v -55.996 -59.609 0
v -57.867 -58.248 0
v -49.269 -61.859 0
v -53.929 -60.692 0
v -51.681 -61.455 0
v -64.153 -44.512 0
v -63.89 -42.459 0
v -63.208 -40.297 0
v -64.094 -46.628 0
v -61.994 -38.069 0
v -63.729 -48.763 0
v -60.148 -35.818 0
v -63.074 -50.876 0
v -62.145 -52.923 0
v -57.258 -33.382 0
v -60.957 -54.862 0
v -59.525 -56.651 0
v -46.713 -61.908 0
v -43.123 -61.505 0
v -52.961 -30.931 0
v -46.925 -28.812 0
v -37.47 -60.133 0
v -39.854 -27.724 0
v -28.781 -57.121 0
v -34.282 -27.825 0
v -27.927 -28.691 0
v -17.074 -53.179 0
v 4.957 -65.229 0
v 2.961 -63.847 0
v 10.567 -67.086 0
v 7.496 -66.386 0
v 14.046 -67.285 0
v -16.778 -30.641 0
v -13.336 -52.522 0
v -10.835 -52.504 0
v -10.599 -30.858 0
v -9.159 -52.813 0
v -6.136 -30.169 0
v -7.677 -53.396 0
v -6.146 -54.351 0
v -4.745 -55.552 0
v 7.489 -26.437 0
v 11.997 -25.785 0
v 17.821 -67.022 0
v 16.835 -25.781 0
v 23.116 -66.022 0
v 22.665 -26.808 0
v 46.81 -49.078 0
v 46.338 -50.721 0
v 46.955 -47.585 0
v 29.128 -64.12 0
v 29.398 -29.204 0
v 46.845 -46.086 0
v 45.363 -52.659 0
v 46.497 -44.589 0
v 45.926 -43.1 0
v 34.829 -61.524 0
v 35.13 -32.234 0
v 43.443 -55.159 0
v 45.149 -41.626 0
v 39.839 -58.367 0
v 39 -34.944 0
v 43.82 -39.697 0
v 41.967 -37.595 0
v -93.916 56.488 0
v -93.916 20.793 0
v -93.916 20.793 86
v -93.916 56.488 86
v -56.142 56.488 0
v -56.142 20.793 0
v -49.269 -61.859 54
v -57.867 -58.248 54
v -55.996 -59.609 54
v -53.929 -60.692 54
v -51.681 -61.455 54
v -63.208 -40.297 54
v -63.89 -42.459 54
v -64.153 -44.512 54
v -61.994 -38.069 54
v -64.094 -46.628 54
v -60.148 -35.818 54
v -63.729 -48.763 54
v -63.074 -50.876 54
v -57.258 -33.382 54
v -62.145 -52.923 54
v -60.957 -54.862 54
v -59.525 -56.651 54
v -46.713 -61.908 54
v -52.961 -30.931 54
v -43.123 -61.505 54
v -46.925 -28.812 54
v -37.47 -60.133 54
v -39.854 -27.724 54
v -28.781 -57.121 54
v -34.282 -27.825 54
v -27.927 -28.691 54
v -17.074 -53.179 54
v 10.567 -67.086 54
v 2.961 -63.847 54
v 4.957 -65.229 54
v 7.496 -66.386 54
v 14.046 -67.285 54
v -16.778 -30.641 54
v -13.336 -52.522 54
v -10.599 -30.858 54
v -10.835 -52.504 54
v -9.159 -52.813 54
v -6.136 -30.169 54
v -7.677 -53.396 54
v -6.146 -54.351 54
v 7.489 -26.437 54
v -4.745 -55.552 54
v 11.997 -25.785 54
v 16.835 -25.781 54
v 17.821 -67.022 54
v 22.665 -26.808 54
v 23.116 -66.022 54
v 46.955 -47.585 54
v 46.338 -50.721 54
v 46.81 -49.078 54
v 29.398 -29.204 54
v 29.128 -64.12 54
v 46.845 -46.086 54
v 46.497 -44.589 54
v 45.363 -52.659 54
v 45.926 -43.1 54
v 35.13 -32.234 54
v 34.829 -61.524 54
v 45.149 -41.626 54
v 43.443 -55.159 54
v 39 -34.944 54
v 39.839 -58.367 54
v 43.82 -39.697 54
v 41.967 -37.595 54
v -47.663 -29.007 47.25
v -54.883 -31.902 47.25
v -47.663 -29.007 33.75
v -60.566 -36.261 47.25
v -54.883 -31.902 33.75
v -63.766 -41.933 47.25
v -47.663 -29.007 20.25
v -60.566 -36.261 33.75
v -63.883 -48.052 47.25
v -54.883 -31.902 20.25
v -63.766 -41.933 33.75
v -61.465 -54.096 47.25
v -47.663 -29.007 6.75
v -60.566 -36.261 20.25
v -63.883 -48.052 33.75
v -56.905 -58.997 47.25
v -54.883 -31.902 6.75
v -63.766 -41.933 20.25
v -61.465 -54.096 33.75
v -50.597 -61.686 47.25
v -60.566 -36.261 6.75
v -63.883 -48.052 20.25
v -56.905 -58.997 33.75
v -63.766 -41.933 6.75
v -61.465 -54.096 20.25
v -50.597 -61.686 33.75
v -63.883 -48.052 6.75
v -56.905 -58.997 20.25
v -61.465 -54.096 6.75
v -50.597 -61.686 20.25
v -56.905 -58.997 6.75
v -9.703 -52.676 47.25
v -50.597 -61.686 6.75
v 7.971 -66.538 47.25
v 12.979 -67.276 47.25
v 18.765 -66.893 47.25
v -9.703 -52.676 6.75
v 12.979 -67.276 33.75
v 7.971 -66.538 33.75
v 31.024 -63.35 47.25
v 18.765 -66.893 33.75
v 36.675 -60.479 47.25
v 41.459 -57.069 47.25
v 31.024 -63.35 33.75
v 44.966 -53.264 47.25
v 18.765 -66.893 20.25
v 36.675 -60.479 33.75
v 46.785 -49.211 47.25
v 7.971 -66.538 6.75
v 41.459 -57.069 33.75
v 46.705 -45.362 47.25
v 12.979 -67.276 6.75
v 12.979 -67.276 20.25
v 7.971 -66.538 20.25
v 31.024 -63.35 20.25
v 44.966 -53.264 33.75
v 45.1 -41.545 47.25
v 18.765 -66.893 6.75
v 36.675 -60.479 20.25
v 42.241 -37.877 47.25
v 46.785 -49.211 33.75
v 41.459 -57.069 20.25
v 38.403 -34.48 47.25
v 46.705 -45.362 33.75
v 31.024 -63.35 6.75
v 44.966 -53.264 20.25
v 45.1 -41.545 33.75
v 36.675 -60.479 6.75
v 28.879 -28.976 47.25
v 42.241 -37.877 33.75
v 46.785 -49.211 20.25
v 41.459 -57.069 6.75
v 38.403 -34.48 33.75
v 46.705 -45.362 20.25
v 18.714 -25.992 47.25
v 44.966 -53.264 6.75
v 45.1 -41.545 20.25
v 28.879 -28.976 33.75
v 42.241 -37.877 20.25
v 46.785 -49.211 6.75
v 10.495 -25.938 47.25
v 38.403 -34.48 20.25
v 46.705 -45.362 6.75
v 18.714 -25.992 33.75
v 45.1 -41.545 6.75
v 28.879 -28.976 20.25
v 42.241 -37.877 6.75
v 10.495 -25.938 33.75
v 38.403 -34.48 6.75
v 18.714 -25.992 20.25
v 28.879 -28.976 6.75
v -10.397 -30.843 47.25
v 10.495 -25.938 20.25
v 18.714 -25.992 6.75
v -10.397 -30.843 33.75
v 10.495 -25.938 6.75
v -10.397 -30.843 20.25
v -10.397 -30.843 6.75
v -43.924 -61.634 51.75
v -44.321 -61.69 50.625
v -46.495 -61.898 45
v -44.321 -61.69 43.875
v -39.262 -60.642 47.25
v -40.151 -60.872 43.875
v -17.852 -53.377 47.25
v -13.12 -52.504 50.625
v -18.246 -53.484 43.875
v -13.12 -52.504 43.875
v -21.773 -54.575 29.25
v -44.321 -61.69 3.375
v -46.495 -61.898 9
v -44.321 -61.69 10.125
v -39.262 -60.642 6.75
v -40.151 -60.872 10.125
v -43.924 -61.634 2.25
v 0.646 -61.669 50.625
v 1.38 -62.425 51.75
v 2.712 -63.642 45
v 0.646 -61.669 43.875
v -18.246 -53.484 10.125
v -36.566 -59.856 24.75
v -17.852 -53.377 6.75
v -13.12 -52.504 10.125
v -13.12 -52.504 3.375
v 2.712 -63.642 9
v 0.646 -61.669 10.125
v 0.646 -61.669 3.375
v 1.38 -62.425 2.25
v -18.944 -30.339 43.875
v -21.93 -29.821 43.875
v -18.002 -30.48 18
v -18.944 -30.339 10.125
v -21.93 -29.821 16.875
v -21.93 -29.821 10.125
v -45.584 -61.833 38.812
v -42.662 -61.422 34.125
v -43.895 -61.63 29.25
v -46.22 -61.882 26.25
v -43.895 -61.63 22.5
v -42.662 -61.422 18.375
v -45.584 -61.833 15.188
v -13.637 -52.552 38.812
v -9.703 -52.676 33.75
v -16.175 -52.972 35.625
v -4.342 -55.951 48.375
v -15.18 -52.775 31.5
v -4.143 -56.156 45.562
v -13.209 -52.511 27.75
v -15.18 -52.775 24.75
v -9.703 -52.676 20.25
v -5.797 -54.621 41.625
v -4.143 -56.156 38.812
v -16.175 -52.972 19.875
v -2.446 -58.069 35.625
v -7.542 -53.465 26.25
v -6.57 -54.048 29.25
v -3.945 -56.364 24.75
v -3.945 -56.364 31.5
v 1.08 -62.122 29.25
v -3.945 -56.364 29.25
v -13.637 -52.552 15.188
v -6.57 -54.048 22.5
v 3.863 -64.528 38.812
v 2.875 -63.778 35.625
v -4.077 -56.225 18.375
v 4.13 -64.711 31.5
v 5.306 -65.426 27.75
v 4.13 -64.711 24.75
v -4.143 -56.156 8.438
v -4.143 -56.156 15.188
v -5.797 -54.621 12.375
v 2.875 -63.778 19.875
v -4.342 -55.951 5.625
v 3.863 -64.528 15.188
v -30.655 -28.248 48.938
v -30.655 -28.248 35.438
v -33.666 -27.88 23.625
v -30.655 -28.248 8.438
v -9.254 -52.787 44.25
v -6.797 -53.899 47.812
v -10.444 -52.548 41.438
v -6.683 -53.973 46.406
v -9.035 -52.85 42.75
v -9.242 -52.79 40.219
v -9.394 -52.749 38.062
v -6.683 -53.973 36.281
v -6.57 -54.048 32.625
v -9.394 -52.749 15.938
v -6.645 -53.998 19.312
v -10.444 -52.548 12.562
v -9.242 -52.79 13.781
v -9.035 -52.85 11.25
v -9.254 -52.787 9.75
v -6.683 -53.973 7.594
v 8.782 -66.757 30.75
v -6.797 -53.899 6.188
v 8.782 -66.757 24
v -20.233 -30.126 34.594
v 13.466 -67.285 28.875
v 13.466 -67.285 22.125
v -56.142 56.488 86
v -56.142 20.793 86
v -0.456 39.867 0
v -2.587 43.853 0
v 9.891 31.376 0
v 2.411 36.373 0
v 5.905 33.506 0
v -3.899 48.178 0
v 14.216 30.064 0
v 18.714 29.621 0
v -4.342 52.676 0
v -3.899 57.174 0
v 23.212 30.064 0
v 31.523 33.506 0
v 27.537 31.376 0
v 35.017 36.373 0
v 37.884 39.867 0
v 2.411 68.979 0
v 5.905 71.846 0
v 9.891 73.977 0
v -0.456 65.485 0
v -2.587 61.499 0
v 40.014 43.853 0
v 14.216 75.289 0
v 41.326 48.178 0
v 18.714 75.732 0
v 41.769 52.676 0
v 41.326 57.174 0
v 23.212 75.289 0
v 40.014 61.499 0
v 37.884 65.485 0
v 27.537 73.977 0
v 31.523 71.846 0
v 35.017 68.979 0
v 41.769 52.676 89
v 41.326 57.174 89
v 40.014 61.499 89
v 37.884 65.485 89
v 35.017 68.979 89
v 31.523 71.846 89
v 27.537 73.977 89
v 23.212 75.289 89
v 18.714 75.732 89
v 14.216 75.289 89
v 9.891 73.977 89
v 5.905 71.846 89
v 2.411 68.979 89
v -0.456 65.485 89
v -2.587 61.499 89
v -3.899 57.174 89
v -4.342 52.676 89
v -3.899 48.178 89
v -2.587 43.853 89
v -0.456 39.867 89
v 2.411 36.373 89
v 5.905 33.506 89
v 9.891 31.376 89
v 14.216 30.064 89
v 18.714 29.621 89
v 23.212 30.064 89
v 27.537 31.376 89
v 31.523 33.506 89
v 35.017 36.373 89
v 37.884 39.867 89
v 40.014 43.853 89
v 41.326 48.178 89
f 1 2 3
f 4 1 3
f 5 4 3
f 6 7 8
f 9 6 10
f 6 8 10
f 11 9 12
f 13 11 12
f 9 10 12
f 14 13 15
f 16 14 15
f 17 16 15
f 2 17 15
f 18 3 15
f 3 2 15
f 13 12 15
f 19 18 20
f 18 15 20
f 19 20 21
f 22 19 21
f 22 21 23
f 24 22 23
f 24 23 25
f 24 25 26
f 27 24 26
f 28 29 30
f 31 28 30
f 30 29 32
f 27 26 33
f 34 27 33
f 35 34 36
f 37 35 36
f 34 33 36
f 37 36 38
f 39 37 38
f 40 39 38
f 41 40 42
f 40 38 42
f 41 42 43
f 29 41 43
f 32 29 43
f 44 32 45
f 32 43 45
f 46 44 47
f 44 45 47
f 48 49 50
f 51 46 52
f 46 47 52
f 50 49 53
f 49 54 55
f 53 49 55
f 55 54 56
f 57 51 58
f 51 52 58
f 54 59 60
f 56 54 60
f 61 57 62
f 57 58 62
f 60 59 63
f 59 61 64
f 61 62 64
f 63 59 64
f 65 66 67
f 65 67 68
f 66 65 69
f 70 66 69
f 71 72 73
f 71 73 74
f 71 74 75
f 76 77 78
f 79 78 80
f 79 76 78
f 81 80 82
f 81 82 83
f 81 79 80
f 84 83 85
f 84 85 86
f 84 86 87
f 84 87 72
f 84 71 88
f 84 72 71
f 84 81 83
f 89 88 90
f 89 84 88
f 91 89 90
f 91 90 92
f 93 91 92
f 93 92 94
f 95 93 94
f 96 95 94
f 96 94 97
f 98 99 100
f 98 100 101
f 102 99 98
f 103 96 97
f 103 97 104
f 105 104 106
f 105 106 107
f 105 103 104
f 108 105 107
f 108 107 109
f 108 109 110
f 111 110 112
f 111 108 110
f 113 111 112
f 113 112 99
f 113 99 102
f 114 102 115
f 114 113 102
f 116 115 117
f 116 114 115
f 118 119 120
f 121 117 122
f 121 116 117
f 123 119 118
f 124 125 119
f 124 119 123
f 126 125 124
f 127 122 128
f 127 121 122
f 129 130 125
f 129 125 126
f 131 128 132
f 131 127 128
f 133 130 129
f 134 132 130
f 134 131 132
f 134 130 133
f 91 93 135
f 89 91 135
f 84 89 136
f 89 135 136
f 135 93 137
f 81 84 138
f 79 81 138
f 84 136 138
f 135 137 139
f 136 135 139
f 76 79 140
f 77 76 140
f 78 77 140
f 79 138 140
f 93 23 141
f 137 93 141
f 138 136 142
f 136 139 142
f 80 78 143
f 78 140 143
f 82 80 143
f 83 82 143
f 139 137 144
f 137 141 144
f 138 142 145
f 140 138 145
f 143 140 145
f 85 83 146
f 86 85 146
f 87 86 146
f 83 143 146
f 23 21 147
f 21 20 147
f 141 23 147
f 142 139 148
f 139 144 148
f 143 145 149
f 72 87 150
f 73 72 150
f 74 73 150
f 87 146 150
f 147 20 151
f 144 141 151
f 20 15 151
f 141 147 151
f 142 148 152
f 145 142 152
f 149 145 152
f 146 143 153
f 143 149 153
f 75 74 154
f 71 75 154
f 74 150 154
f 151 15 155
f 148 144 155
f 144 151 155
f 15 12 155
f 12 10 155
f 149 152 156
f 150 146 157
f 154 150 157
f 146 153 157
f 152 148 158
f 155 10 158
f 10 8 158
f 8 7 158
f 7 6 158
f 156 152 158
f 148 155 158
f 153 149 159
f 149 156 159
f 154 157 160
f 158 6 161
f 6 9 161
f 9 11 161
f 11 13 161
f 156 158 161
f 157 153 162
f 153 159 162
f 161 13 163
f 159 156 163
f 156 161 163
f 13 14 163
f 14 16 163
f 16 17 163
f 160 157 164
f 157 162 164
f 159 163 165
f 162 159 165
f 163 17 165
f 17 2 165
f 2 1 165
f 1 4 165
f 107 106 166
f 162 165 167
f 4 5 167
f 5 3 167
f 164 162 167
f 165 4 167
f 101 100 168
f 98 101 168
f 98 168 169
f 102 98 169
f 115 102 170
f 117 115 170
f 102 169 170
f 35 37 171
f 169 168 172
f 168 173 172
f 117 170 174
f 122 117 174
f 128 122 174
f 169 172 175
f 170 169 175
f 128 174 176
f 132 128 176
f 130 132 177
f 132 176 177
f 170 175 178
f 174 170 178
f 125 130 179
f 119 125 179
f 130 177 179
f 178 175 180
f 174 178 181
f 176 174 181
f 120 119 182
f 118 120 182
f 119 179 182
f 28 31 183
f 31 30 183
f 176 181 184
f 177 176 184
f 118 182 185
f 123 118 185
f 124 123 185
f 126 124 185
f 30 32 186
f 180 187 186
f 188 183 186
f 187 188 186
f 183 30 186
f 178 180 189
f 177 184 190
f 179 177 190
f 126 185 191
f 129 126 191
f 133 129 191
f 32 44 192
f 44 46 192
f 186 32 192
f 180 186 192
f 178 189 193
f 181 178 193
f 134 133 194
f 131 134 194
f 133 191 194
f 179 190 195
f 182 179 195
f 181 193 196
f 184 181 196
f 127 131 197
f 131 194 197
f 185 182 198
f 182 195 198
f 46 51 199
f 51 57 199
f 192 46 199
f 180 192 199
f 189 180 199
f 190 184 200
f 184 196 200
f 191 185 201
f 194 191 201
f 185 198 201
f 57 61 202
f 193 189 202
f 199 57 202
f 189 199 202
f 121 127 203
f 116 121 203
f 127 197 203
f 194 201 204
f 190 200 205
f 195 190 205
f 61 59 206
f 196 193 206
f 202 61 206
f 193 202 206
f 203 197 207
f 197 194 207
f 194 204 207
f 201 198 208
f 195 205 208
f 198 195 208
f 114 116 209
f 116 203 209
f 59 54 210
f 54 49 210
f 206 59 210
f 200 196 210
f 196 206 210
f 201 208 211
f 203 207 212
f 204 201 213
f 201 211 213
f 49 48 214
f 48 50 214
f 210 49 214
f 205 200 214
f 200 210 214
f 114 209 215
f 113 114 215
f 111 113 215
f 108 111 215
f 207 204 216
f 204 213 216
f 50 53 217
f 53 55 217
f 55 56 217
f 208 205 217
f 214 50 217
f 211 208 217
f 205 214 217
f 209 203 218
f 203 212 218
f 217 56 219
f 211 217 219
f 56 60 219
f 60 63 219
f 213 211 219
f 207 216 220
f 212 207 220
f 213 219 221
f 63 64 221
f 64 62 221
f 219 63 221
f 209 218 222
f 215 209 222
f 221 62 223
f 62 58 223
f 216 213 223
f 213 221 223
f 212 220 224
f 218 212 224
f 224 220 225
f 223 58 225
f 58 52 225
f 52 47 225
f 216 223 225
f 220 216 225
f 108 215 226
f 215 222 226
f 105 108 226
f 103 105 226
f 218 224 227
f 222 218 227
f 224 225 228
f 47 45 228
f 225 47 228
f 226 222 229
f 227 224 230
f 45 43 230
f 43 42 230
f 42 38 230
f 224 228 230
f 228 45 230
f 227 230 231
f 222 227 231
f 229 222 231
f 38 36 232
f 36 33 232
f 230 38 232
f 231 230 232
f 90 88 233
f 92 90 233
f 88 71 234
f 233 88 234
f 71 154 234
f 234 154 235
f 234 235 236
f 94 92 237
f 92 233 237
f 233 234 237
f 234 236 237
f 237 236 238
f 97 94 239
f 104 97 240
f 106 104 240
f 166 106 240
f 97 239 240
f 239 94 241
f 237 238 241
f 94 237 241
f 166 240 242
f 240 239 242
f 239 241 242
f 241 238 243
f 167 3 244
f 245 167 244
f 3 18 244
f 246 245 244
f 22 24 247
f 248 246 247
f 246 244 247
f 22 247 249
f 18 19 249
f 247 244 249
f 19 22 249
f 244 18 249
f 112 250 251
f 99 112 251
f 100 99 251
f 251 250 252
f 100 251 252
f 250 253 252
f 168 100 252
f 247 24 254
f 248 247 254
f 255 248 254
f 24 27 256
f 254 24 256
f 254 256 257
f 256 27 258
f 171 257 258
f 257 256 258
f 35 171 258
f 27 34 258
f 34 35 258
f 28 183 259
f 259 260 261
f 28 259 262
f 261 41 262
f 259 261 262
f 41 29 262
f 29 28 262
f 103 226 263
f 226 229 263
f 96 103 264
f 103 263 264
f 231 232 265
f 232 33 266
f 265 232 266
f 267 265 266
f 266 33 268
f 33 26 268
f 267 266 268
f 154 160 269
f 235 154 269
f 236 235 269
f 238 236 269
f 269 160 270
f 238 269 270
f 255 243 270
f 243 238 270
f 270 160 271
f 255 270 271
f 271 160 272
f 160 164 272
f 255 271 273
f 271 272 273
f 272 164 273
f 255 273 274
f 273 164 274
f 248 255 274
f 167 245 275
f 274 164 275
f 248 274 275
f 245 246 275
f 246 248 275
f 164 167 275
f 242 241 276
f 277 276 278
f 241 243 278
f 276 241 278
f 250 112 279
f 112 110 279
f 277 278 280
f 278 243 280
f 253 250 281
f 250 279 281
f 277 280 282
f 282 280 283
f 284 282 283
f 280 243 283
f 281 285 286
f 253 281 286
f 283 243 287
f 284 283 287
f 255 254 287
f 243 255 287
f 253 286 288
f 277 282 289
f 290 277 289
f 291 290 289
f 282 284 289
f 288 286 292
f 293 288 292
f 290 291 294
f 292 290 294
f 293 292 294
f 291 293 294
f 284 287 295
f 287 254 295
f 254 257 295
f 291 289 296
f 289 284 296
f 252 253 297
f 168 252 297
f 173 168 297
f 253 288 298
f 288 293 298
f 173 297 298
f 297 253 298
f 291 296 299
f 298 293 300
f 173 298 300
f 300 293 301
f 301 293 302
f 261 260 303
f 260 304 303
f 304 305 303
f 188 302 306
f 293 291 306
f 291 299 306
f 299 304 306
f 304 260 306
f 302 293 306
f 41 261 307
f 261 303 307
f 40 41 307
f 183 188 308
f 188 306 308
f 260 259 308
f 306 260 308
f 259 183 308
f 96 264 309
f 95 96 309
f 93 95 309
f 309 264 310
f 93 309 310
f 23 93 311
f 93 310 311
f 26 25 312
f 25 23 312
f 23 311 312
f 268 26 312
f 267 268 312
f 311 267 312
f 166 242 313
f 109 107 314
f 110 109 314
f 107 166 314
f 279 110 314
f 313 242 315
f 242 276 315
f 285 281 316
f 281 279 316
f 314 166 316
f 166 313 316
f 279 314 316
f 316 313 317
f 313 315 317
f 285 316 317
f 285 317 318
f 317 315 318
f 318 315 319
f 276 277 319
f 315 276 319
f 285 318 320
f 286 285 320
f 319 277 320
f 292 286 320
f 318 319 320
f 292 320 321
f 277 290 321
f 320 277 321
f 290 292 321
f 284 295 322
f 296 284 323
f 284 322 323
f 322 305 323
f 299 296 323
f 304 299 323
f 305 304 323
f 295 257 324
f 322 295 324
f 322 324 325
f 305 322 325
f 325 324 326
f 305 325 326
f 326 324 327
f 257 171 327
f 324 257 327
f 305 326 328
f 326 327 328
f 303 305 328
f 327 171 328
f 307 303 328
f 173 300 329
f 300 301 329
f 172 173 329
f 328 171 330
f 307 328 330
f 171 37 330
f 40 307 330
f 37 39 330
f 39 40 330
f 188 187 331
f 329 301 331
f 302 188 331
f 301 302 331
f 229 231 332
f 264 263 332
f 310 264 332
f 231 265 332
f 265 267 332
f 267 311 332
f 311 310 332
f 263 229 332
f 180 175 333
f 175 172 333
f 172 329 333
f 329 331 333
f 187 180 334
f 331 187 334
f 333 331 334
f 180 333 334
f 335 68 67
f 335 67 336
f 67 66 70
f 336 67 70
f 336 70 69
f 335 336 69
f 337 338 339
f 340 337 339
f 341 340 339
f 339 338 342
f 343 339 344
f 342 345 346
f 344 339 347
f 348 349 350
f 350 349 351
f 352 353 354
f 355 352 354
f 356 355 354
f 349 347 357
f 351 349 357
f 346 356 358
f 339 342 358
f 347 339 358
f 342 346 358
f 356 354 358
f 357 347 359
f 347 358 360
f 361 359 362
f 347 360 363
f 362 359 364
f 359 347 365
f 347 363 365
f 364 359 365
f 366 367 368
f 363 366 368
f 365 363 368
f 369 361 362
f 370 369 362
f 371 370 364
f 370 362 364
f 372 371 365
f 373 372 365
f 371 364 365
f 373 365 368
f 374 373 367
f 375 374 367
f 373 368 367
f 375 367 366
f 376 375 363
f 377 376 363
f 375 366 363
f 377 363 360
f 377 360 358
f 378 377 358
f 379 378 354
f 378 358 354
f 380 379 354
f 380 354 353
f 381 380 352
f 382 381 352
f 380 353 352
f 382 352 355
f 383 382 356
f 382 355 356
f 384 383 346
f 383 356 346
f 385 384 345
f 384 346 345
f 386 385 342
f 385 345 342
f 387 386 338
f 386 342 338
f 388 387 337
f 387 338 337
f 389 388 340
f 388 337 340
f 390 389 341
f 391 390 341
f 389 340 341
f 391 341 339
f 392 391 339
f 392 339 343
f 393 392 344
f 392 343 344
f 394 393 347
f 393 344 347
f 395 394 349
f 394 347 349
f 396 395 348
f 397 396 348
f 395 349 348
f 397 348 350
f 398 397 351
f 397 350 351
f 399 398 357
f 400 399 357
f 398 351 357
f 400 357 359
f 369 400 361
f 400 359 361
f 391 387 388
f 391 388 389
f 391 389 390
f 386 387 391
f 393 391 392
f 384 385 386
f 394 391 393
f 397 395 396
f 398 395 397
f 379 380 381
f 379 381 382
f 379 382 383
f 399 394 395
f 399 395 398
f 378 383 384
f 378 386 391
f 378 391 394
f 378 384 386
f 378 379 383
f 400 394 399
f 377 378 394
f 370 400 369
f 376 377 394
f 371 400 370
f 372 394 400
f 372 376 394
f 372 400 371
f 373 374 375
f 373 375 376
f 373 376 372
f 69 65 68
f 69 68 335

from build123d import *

# Parameters (mm, degrees)
F1_DEPTH = 54
F0_R     = 23.0555619828
F2_DEPTH = 89
F0_W     = 37.7743057907
F0_H     = 35.6949903071
F3_DEPTH = 86


# Not quite as in the source:
# - the program builds the solid bodies; features that only make, move or delete a surface that nothing else refers to are left out


with BuildPart() as f1:
    # F0 (on Top) → F1 (new body)
    with BuildSketch(Plane.XY):
        with BuildLine():
            add(Edge.make_bspline(
                [(-39.8536287248, -27.7242679149), (-50.2375219072, -28.2925626406), (-72.053468967, -38.4287091274), (-52.3114138524, -73.8395869052), (-5.4344000682, -40.8979144482), (2.0226294599, -77.3246249013), (67.3517685782, -51.0572269021), (16.3081275338, -17.8312624321), (-9.7598597024, -35.967977136), (-29.1378204925, -27.1378079818), (-39.8536287248, -27.7242679149)],
                knots=[0, 0, 0, 0, 0.1177566126, 0.2265475614, 0.3710310856, 0.4768512147, 0.6224209007, 0.7571839019, 0.8784793664, 1, 1, 1, 1], degree=3))
        make_face()
    extrude(amount=F1_DEPTH)


with BuildPart() as f2:
    # F0 (on Top) → F2 (new body)
    with BuildSketch(Plane.XY):
        with Locations((18.7138784677, 52.6760928333)):
            Circle(F0_R)
    extrude(amount=F2_DEPTH)


with BuildPart() as f3:
    # F0 (on Top) → F3 (new body)
    with BuildSketch(Plane.XY):
        with Locations((-75.0287864357, 38.6406872422)):
            Rectangle(F0_W, F0_H)
    extrude(amount=F3_DEPTH)


solid = Compound([f1.part, f2.part, f3.part])
